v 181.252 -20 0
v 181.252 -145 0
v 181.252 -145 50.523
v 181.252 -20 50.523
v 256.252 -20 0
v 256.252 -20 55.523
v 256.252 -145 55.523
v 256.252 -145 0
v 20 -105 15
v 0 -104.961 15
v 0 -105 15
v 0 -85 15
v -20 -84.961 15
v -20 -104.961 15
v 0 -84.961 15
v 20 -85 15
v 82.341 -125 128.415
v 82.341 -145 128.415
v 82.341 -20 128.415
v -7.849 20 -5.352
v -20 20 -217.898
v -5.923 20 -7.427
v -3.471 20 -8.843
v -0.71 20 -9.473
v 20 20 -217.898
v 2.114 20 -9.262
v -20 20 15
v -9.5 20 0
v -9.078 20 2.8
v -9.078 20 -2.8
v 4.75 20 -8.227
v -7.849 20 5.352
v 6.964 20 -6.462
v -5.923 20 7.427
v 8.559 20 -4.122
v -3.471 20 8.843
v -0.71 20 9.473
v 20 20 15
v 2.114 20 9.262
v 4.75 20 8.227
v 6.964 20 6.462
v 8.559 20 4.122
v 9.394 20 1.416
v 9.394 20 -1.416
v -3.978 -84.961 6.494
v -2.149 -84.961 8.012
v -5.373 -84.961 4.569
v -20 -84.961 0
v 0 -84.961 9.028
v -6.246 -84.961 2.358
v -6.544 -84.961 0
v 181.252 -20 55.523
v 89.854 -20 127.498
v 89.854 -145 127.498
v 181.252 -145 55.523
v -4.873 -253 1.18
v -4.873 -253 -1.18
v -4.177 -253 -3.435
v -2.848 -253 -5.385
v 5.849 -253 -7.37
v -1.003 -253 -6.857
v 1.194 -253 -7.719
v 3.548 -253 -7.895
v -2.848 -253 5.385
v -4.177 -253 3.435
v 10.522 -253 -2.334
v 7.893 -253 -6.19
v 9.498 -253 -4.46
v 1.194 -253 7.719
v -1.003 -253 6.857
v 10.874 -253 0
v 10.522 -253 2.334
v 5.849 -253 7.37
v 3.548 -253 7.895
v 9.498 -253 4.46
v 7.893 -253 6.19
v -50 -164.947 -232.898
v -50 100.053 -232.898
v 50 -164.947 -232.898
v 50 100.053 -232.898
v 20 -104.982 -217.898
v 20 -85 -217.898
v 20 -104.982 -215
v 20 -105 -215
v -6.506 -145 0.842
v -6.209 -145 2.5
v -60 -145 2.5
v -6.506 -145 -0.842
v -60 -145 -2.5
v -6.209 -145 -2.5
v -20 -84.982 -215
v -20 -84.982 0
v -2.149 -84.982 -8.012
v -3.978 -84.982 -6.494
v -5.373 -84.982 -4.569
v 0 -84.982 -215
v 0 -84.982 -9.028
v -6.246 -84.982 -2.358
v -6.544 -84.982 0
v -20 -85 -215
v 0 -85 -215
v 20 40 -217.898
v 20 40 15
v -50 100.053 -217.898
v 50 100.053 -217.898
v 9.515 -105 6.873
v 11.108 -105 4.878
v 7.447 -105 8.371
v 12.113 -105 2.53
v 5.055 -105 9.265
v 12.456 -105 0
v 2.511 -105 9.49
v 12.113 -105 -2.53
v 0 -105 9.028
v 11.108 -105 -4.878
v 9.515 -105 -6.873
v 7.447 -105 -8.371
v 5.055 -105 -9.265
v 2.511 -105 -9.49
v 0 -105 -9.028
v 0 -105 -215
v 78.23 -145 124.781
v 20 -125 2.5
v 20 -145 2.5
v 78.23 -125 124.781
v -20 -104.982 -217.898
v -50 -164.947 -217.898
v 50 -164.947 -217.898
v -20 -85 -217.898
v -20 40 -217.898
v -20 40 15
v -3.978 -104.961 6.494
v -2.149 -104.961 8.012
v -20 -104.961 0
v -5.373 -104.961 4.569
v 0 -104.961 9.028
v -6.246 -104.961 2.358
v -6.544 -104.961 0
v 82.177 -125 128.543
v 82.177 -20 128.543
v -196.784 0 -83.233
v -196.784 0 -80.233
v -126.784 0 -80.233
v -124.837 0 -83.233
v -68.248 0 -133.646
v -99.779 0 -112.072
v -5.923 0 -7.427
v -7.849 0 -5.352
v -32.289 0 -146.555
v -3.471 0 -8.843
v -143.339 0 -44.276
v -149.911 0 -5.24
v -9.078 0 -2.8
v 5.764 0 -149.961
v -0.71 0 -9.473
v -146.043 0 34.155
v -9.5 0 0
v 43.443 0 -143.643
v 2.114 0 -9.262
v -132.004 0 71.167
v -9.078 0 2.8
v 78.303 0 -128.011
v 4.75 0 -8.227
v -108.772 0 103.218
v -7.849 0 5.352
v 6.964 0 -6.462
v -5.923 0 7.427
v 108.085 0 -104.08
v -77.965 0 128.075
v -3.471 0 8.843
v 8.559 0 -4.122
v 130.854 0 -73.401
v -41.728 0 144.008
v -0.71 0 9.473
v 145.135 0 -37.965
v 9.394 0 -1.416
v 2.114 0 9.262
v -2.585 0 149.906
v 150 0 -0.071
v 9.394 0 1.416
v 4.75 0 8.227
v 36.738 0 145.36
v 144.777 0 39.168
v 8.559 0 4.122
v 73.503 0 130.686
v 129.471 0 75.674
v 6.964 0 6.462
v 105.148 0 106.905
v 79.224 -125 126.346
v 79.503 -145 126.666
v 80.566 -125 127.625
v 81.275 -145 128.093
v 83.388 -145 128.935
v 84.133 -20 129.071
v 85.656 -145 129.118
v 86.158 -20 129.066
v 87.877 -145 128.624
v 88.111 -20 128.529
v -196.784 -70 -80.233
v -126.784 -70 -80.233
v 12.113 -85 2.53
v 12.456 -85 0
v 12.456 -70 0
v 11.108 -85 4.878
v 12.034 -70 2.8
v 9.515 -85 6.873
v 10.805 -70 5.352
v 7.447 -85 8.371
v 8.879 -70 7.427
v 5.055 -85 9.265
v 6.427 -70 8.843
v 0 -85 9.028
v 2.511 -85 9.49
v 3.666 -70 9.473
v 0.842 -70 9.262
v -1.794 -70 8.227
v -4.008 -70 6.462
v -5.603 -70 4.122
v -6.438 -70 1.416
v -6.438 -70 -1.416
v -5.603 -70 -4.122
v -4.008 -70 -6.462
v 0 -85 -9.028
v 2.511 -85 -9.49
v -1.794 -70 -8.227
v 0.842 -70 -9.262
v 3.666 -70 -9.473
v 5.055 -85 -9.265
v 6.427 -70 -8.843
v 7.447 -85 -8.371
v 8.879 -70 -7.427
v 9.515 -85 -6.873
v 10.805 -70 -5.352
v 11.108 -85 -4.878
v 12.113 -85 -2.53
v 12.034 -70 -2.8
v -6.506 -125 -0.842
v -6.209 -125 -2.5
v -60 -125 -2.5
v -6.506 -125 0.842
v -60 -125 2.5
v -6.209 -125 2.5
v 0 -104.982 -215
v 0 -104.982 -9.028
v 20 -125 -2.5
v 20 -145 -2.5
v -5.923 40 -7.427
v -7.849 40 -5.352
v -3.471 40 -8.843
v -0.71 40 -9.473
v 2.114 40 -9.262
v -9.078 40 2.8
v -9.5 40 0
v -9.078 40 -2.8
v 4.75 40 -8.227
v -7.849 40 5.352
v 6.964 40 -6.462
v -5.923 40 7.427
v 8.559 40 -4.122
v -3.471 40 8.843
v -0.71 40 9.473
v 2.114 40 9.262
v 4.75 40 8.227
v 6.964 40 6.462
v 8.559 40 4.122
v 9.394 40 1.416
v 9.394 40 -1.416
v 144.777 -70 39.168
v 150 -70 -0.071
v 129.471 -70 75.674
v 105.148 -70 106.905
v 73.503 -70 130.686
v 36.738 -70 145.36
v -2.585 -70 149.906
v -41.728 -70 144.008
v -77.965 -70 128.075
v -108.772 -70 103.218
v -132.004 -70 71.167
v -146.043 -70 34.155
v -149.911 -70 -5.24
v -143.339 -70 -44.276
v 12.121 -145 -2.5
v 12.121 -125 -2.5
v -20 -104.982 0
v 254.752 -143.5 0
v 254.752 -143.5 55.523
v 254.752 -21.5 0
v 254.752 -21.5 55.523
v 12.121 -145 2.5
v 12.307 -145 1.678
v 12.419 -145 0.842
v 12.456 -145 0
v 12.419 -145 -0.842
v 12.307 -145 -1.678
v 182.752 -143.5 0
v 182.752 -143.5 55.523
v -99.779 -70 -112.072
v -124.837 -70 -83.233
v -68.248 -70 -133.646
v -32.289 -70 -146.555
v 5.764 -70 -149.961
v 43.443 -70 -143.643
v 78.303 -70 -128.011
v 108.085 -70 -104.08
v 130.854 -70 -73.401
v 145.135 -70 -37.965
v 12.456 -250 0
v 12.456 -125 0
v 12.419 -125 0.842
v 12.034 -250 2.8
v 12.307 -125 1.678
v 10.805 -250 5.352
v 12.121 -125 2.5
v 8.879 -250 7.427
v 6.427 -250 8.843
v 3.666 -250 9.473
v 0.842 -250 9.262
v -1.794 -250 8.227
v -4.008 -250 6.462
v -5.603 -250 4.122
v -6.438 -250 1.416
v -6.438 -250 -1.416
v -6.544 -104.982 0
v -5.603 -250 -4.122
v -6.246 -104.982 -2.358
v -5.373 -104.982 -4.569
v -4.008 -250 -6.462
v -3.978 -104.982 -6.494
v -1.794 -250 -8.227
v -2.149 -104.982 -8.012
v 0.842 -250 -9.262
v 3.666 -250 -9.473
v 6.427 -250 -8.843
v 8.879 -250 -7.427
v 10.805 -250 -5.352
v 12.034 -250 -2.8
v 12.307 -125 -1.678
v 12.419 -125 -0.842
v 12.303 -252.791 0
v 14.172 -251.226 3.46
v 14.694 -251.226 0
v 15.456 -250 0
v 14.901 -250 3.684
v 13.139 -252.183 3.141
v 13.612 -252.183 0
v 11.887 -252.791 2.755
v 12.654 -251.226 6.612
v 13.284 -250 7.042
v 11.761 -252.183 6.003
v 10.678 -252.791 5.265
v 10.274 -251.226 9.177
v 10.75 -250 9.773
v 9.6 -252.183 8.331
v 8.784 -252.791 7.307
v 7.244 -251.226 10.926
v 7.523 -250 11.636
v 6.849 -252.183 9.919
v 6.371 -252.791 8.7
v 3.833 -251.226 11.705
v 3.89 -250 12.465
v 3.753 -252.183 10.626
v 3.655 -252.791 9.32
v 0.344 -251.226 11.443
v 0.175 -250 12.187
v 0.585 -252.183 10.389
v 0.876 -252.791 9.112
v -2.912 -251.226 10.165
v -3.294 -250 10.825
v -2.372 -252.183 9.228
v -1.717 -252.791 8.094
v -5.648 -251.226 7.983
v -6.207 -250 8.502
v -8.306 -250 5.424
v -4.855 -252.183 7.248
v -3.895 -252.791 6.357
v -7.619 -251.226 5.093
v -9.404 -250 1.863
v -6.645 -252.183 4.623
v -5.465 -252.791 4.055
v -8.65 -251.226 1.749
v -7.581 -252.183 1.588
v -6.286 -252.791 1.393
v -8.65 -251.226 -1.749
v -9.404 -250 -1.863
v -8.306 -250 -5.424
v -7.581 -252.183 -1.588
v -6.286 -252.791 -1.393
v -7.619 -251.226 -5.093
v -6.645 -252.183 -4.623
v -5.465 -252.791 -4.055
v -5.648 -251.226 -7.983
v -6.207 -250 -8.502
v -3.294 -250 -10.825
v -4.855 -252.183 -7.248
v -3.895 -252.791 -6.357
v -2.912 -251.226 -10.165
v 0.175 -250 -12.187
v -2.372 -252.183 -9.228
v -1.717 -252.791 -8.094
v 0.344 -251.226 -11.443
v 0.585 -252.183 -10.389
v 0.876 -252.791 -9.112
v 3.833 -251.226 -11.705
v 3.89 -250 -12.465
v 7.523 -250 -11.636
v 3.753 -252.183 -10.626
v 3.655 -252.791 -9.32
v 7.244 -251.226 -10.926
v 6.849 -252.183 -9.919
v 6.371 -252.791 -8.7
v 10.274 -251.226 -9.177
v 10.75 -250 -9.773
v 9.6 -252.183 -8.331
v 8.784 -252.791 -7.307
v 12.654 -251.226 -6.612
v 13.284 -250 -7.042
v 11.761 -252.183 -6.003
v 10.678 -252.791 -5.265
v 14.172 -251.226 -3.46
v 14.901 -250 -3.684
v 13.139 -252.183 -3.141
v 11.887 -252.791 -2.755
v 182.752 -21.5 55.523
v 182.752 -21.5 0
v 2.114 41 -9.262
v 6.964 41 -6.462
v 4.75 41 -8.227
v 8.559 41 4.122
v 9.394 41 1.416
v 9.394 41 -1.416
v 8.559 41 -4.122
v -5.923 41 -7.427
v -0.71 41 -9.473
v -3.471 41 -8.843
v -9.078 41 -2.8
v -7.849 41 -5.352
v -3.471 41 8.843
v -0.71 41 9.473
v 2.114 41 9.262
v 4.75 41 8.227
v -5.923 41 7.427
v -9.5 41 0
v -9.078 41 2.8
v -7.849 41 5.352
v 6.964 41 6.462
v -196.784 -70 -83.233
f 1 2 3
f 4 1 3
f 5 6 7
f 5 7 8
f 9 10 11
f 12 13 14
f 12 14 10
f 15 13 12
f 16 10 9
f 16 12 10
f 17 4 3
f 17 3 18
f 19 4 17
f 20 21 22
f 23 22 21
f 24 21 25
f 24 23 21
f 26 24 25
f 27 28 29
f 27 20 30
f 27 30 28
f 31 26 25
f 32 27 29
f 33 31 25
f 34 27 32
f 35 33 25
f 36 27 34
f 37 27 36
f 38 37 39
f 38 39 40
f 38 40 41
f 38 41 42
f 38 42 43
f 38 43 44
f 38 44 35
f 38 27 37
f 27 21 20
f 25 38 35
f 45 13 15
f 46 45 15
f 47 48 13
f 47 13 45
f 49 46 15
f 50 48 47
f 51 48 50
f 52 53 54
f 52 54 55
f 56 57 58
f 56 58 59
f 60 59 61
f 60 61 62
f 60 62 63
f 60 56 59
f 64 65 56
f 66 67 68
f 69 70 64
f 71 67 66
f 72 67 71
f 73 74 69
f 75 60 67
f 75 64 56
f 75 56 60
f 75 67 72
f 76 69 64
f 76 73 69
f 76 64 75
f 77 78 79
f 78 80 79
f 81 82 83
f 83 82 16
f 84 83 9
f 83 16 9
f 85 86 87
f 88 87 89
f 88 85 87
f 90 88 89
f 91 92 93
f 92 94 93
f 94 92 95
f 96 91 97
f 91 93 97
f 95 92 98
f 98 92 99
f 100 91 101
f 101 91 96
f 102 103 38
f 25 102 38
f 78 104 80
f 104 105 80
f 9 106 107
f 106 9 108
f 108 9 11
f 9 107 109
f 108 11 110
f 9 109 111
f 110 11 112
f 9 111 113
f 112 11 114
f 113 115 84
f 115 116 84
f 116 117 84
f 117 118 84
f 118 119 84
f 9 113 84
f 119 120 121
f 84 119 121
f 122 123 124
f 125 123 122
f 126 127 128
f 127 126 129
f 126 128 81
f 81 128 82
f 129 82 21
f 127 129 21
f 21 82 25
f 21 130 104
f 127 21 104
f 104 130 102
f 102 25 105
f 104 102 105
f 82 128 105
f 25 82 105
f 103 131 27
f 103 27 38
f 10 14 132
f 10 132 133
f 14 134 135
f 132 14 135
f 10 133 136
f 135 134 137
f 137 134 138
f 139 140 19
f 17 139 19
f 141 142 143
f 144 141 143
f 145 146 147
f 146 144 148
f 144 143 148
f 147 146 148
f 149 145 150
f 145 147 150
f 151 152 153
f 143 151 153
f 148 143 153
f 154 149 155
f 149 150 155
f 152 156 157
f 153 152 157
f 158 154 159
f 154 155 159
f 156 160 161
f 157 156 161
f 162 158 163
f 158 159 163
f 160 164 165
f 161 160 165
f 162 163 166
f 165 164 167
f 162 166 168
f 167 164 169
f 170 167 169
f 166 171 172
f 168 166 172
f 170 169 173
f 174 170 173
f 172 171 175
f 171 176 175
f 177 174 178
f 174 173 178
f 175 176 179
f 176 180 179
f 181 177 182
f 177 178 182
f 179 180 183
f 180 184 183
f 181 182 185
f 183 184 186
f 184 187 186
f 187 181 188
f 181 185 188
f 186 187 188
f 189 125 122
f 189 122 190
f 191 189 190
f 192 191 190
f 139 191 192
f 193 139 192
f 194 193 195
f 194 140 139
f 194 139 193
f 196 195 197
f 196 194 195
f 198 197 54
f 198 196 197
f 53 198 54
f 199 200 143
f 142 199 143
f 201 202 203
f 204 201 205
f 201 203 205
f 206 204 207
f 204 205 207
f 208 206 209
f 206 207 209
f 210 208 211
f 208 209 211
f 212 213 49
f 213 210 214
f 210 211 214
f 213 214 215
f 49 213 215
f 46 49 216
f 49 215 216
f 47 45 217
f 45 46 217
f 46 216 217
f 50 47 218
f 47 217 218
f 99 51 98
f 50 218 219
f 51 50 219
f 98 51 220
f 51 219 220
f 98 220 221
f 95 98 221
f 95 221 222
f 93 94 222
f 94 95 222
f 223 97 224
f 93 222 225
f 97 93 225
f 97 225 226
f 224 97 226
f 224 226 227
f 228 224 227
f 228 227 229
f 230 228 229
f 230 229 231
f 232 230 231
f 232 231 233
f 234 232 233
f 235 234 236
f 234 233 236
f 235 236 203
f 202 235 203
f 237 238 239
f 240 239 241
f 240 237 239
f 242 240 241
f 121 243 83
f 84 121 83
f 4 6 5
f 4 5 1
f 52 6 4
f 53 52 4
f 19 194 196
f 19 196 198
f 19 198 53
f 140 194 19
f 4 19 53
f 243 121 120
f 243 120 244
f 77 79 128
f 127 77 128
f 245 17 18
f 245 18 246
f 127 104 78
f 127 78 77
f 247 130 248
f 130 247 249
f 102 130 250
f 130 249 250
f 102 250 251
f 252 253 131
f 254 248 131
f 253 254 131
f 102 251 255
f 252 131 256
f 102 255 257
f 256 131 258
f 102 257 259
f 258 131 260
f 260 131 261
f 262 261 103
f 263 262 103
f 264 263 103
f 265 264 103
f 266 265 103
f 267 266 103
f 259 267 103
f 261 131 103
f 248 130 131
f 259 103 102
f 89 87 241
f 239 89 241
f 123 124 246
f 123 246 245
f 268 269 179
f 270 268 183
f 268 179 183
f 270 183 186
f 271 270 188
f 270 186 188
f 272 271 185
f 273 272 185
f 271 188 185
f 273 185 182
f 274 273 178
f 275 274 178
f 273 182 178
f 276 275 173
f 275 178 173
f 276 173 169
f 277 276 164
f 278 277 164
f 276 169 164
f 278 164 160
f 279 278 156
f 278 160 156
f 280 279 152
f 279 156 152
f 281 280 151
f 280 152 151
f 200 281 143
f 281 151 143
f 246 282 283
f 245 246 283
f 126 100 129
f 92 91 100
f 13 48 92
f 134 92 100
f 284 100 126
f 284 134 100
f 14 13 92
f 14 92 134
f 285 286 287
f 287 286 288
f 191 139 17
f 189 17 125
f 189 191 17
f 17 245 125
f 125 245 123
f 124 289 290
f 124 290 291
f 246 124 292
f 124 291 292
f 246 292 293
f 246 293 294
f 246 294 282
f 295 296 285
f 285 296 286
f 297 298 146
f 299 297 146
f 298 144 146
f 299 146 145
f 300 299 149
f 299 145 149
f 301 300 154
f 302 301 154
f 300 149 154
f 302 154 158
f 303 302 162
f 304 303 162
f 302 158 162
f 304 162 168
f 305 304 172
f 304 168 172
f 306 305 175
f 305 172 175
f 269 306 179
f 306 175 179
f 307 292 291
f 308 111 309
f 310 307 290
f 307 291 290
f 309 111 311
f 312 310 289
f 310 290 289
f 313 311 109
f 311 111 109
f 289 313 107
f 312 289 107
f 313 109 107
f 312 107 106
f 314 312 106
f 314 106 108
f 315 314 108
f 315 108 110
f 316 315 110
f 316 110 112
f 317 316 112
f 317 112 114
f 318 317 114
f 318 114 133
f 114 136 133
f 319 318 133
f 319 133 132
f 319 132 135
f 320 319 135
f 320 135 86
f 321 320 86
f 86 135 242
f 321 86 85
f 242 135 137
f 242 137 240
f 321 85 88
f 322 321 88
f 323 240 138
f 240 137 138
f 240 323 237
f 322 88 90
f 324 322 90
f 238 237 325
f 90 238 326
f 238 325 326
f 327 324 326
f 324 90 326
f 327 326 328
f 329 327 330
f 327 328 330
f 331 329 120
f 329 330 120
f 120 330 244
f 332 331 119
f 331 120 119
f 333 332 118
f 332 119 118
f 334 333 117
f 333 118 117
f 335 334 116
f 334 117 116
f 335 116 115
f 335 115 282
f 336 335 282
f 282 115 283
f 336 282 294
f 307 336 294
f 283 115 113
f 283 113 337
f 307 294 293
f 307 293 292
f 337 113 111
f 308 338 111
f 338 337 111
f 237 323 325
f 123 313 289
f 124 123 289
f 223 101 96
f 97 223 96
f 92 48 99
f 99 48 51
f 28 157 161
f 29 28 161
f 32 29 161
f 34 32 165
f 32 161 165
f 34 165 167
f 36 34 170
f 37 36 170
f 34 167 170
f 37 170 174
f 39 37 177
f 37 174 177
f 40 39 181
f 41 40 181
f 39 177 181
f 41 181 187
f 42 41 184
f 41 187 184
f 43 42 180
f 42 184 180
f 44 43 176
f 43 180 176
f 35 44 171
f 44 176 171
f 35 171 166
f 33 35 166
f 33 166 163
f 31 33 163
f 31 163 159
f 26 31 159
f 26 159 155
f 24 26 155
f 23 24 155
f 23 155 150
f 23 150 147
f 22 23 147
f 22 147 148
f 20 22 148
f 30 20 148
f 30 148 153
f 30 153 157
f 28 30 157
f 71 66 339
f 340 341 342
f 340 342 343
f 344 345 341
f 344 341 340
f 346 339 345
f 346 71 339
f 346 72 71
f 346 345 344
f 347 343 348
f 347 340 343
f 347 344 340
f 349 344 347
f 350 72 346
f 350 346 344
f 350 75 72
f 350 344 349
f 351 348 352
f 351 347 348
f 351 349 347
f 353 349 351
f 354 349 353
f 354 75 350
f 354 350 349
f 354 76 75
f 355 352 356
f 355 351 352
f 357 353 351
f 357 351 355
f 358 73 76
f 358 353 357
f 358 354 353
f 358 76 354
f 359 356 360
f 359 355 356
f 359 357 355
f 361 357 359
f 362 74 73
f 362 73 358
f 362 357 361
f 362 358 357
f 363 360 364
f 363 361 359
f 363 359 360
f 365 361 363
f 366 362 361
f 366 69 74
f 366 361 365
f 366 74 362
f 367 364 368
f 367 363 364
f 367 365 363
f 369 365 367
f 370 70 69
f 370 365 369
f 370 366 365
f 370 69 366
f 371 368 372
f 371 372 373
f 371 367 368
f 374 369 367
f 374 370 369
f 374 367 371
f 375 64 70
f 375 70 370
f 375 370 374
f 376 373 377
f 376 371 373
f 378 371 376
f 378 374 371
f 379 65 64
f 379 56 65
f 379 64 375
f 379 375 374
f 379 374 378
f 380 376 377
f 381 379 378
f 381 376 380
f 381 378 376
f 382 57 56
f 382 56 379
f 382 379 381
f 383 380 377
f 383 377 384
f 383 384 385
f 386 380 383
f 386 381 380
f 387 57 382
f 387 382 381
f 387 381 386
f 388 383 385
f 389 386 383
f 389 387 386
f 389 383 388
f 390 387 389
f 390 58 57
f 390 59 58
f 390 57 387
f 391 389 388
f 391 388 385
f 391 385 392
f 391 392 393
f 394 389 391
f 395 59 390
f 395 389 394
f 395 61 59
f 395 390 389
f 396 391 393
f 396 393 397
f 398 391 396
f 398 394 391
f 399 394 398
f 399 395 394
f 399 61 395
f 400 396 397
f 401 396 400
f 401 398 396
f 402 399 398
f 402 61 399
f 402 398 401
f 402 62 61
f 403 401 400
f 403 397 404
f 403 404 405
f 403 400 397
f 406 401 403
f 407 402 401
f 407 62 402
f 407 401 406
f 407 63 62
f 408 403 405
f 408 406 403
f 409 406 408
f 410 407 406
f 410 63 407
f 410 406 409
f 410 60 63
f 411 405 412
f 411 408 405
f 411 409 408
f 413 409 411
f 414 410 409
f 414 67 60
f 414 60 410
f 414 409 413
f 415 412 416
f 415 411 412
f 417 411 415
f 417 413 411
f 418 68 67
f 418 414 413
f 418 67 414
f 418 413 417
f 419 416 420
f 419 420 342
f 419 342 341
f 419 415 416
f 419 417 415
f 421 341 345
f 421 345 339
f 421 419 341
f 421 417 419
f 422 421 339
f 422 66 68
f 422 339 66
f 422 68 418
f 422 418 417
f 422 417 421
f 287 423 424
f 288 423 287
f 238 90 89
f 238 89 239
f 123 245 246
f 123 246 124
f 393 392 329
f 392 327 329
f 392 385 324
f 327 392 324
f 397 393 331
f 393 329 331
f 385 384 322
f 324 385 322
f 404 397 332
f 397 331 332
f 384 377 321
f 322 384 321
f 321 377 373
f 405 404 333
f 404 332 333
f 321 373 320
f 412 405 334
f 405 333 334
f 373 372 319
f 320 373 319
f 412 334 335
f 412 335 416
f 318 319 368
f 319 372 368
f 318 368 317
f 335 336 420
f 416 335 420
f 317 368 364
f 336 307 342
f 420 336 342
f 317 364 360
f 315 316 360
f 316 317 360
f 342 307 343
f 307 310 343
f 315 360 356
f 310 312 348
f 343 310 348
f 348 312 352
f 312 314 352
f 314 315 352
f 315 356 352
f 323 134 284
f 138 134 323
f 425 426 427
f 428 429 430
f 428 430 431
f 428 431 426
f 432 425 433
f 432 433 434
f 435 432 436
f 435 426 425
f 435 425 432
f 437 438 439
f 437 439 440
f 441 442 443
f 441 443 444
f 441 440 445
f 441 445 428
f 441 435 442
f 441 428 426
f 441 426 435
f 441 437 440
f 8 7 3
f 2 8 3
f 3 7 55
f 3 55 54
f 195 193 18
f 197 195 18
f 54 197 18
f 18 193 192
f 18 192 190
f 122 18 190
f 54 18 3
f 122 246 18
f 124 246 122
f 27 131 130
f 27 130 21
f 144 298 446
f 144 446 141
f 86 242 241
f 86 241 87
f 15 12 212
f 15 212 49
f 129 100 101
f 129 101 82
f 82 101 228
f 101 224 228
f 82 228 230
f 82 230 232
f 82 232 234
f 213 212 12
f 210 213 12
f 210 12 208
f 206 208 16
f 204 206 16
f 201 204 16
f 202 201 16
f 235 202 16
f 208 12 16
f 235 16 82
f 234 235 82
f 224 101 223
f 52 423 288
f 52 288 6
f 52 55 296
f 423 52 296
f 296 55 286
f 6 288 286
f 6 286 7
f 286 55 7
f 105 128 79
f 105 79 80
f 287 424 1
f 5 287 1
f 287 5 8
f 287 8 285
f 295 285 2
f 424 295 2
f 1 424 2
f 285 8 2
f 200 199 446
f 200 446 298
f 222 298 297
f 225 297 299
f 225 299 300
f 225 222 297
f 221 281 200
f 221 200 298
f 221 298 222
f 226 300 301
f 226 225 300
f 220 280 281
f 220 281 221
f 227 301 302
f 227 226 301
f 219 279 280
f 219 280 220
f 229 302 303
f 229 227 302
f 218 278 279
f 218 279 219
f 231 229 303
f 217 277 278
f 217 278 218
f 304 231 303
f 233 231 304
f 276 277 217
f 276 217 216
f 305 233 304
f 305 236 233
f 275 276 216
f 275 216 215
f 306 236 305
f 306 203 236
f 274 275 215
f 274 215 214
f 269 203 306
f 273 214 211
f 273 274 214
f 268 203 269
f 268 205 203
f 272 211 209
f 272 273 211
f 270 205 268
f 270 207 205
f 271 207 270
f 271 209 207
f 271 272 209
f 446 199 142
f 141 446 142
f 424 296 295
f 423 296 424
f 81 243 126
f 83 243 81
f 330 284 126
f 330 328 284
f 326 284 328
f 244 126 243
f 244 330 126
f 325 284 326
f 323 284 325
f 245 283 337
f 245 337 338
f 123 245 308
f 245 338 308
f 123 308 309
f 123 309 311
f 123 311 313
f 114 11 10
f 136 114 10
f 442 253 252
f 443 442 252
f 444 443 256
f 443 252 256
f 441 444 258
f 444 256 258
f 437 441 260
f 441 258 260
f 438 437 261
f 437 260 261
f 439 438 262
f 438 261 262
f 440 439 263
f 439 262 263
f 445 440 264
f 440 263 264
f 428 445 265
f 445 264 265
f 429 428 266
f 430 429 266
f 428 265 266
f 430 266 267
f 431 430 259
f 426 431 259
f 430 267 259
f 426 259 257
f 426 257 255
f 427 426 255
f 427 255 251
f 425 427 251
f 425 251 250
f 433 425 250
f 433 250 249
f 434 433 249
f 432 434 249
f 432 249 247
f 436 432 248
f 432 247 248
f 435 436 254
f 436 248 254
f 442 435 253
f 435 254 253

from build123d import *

# Parameters (mm, degrees)
F0_R         = 150
F1_DEPTH     = 70
F2_W         = 70
F2_H         = 3
F3_DEPTH     = 196.784
F5_R         = 9.5
F6_DEPTH     = 180
F7_R         = 9.5
F8_DEPTH     = 40
F9_W         = 20
F9_H         = 215
F10_DEPTH    = 20
F11_W        = 20
F11_H        = 18.9998925924
F11_H_2      = 196.0001074076
F12_DEPTH    = 20
F13_W        = 20
F13_H        = 20
F14_DEPTH    = 15
F15_W        = 40
F15_H        = 20
F16_DEPTH    = 25
F17_W        = 20
F17_H        = 215
F17_H_2      = 15
F18_DEPTH    = 20
F19_W        = 20
F19_H        = 20
F20_DEPTH    = 15
F21_W        = 20
F21_H        = 20
F22_DEPTH    = 215
F23_W        = 40
F23_H        = 19.9821153283
F24_DEPTH    = 15.5
F26_DEPTH    = 50
F28_DEPTH    = 50
F30_DEPTH    = 60
F31_DEPTH    = 20
F34_DEPTH    = 20
F36_DEPTH    = 125
F37_DEPTH    = 105
F38_W        = 72
F38_H        = 122
F30_FACE_W   = 53.7910459743
F30_FACE_H   = 20
F39_DEPTH    = 161
F40_R        = 12.5
F41_DEPTH    = 3
F43_R        = 9.5
F44_DEPTH    = 1
F45_T1_DEPTH = 172.813612667


# Not quite as in the source:
# - a fillet or chamfer that OpenCascade refuses, or shapes differently, is made with other operations: its cross-section is extruded or revolved along the edge and cut away or added


with BuildPart() as f1:
    # F0 (on Front) → F1 (new body)
    with BuildSketch(Plane.XZ):
        with Locations((0, -0.0713349276)):
            Circle(F0_R)
    extrude(amount=F1_DEPTH)

    # F2 (on Right) → F3 (join)
    with BuildSketch(Plane.YZ):
        with Locations((-35, -81.7328423858)):
            Rectangle(F2_W, F2_H)
    extrude(amount=-F3_DEPTH)

    # F5 (on face) → F6 (join)
    with BuildSketch(Plane.XZ.offset(70)):
        with Locations((2.9561973643, 0)):
            Circle(F5_R)
    extrude(amount=F6_DEPTH)

    # F7 (on face) → F8 (join)
    with BuildSketch(Plane(origin=(0, 0, 0), x_dir=(-1, 0, 0), z_dir=(0, 1, 0))):
        Circle(F7_R)
    extrude(amount=F8_DEPTH)

    # F9 (on Right) → F10 (join)
    with BuildSketch(Plane.YZ):
        with Locations((30, -98.0001074076)):
            Rectangle(F9_W, F9_H)
    extrude(amount=-F10_DEPTH)

    # F11 (on face) → F12 (join)
    with BuildSketch(Plane.YZ):
        with Locations((30, -5.37038e-05)):
            Rectangle(F11_W, F11_H)
        with Locations((30, -107.5000537038)):
            Rectangle(F11_W, F11_H_2)
    extrude(amount=F12_DEPTH)

    # F13 (on Top) → F14 (join)
    with BuildSketch(Plane.XY):
        with Locations((-10, 30)):
            Rectangle(F13_W, F13_H)
        with Locations((10, 30)):
            Rectangle(F13_W, F13_H)
    extrude(amount=F14_DEPTH)

    # F15 (on face) → F16 (join)
    with BuildSketch(Plane(origin=(0, 0, -205.5001074076), x_dir=(1, 0, 0), z_dir=(0, 0, -1))):
        with Locations((0, -30)):
            Rectangle(F15_W, F15_H)
    extrude(amount=F16_DEPTH)

    # F17 (on Right) → F18 (join)
    with BuildSketch(Plane.YZ):
        with Locations((-95, -107.5)):
            Rectangle(F17_W, F17_H)
        with Locations((-95, 7.5)):
            Rectangle(F17_W, F17_H_2)
    extrude(amount=F18_DEPTH)

    # F19 (on Top) → F20 (join)
    with BuildSketch(Plane.XY):
        with Locations((-10, -94.9609184265)):
            Rectangle(F19_W, F19_H)
    extrude(amount=F20_DEPTH)

    # F21 (on Top) → F22 (join)
    with BuildSketch(Plane.XY):
        with Locations((-10, -94.9821153283)):
            Rectangle(F21_W, F21_H)
    extrude(amount=-F22_DEPTH)

    # F23 (on face) → F24 (join)
    with BuildSketch(Plane(origin=(0, 0, -215), x_dir=(1, 0, 0), z_dir=(0, 0, -1))):
        with Locations((0, 94.9910576642)):
            Rectangle(F23_W, F23_H)
    extrude(amount=F24_DEPTH)

    # F25 (on Right) → F26 (join)
    with BuildSketch(Plane.YZ):
        Polygon((40.000025183, -230.4975450993), (40.0528562069, -217.8975450993), (40.0000102818, -217.8975450993), (-141.9770932198, -217.8975450993), (-164.9471437931, -217.8975450993), (-164.9471437931, -232.8975450993), (-126.0763406754, -232.8975450993), (20.0036764145, -232.8975450993), (40.000025183, -232.8975450993), align=None)
        Polygon((100.0528562069, -217.8975450993), (40.0528562069, -217.8975450993), (40.000025183, -230.4975450993), (40.000025183, -232.8975450993), (100.0528562069, -232.8975450993), align=None)
    extrude(amount=F26_DEPTH)

    # F27 (on face) → F28 (join)
    with BuildSketch(Plane(origin=(0, 0, 0), x_dir=(0, -1, 0), z_dir=(-1, 0, 0))):
        Polygon((164.9471437931, -217.8975450993), (-100.0528562069, -217.8975450993), (-100.0528562069, -232.8975450993), (-40, -232.8975450993), (164.9471437931, -232.8975450993), align=None)
    extrude(amount=F28_DEPTH)

    # F29 (on Right) → F30 (join)
    with BuildSketch(Plane.YZ):
        Polygon((-145, 2.5), (-145, -2.5), (-125, -2.5), (-125, 0), (-125, 2.5), align=None)
    extrude(amount=-F30_DEPTH)

    # F29 (on Right) → F31 (join)
    with BuildSketch(Plane.YZ):
        Polygon((-145, 2.5), (-145, -2.5), (-125, -2.5), (-125, 0), (-125, 2.5), align=None)
    extrude(amount=F31_DEPTH)

    # F40 (on face) → F41 (join)
    with BuildSketch(Plane.XZ.offset(250)):
        with Locations((2.9561973643, 0)):
            Circle(F40_R)
    extrude(amount=F41_DEPTH)

    # F42: fillet of radius 5 on 1 edges, made by hand

    # F42_s1 → F42_t2 (revolve, cut)
    with BuildSketch(Plane.XY):
        with BuildLine():
            ThreePointArc((15.4561973643, -250), (13.6122344568, -252.1833001327), (10.8736216693, -253))
            Line((10.8736216693, -253), (15.4561973643, -253))
            Line((15.4561973643, -253), (15.4561973643, -250))
        make_face()
    revolve(axis=Axis((2.9561973643, -253, 0), (0, -1, 0)), mode=Mode.SUBTRACT)

    # F43 (on face) → F44 (join)
    with BuildSketch(Plane(origin=(0, 40, 0), x_dir=(-1, 0, 0), z_dir=(0, 1, 0))):
        Circle(F43_R)
    extrude(amount=F44_DEPTH)


with BuildPart() as f34:
    # F33 (on offset) → F34 (new body)
    with BuildSketch(Plane(origin=(0, -125, 0), x_dir=(-1, 0, 0), z_dir=(0, 1, 0))):
        Polygon((-20.0000386685, -2.5), (-20.0000386685, 0), (-20.0000386685, 2.5), (-82.3409290722, 133.4145270154), (-181.2517998233, 55.5228017236), (-181.2517998233, 50.5228017236), (-82.3409290722, 128.4145270154), align=None)
        Polygon((-181.2517998233, 50.5228017236), (-181.2517998233, 55.5228017236), (-256.2517998233, 55.5228017236), (-256.2517998233, 0), (-181.2517998233, 0), align=None)
    extrude(amount=-F34_DEPTH)

    # F35 (on face) → F36 (join)
    with BuildSketch(Plane.XZ.offset(145)):
        Polygon((80.6093108737, 129.7781660978), (82.3409290722, 128.4145270154), (181.2517998233, 50.5228017236), (181.2517998233, 55.5228017236), (82.3409290722, 133.4145270154), align=None)
    extrude(amount=-F36_DEPTH)

    # F37 (add): a face of the model
    f37_faces = [f34.faces().sort_by_distance(p)[0] for p in [
        (218.7517998233, -125, 27.7614008618),
    ]]
    extrude(f37_faces, amount=F37_DEPTH)

    # F38 (on face) + F30_face (on face) → F39 (cut)
    with BuildSketch(Plane.XY.offset(55.5228017236)):
        with Locations((218.7517998233, -82.5)):
            Rectangle(F38_W, F38_H)
    with BuildSketch(Plane(origin=(-33.1044770128, -135, 2.5), x_dir=(1, 0, 0), z_dir=(0, 0, 1))):
        Rectangle(F30_FACE_W, F30_FACE_H)
    extrude(amount=-F39_DEPTH, mode=Mode.SUBTRACT)

    # F45: fillet of radius 7.6397458968 on 1 edges, made by hand

    # F45_s2 → F45_t1 (cut)
    with BuildSketch(Plane.XZ.offset(-3.9068063335)):
        with BuildLine():
            ThreePointArc((78.229559159, 124.7807387572), (83.3880678847, 128.9352971366), (89.8537727751, 127.4982070657))
            Line((89.8537727751, 127.4982070657), (82.3409290722, 133.4145270154))
            Line((82.3409290722, 133.4145270154), (78.229559159, 124.7807387572))
        make_face()
    extrude(amount=F45_T1_DEPTH, mode=Mode.SUBTRACT)


solid = Compound([f1.part, f34.part])
